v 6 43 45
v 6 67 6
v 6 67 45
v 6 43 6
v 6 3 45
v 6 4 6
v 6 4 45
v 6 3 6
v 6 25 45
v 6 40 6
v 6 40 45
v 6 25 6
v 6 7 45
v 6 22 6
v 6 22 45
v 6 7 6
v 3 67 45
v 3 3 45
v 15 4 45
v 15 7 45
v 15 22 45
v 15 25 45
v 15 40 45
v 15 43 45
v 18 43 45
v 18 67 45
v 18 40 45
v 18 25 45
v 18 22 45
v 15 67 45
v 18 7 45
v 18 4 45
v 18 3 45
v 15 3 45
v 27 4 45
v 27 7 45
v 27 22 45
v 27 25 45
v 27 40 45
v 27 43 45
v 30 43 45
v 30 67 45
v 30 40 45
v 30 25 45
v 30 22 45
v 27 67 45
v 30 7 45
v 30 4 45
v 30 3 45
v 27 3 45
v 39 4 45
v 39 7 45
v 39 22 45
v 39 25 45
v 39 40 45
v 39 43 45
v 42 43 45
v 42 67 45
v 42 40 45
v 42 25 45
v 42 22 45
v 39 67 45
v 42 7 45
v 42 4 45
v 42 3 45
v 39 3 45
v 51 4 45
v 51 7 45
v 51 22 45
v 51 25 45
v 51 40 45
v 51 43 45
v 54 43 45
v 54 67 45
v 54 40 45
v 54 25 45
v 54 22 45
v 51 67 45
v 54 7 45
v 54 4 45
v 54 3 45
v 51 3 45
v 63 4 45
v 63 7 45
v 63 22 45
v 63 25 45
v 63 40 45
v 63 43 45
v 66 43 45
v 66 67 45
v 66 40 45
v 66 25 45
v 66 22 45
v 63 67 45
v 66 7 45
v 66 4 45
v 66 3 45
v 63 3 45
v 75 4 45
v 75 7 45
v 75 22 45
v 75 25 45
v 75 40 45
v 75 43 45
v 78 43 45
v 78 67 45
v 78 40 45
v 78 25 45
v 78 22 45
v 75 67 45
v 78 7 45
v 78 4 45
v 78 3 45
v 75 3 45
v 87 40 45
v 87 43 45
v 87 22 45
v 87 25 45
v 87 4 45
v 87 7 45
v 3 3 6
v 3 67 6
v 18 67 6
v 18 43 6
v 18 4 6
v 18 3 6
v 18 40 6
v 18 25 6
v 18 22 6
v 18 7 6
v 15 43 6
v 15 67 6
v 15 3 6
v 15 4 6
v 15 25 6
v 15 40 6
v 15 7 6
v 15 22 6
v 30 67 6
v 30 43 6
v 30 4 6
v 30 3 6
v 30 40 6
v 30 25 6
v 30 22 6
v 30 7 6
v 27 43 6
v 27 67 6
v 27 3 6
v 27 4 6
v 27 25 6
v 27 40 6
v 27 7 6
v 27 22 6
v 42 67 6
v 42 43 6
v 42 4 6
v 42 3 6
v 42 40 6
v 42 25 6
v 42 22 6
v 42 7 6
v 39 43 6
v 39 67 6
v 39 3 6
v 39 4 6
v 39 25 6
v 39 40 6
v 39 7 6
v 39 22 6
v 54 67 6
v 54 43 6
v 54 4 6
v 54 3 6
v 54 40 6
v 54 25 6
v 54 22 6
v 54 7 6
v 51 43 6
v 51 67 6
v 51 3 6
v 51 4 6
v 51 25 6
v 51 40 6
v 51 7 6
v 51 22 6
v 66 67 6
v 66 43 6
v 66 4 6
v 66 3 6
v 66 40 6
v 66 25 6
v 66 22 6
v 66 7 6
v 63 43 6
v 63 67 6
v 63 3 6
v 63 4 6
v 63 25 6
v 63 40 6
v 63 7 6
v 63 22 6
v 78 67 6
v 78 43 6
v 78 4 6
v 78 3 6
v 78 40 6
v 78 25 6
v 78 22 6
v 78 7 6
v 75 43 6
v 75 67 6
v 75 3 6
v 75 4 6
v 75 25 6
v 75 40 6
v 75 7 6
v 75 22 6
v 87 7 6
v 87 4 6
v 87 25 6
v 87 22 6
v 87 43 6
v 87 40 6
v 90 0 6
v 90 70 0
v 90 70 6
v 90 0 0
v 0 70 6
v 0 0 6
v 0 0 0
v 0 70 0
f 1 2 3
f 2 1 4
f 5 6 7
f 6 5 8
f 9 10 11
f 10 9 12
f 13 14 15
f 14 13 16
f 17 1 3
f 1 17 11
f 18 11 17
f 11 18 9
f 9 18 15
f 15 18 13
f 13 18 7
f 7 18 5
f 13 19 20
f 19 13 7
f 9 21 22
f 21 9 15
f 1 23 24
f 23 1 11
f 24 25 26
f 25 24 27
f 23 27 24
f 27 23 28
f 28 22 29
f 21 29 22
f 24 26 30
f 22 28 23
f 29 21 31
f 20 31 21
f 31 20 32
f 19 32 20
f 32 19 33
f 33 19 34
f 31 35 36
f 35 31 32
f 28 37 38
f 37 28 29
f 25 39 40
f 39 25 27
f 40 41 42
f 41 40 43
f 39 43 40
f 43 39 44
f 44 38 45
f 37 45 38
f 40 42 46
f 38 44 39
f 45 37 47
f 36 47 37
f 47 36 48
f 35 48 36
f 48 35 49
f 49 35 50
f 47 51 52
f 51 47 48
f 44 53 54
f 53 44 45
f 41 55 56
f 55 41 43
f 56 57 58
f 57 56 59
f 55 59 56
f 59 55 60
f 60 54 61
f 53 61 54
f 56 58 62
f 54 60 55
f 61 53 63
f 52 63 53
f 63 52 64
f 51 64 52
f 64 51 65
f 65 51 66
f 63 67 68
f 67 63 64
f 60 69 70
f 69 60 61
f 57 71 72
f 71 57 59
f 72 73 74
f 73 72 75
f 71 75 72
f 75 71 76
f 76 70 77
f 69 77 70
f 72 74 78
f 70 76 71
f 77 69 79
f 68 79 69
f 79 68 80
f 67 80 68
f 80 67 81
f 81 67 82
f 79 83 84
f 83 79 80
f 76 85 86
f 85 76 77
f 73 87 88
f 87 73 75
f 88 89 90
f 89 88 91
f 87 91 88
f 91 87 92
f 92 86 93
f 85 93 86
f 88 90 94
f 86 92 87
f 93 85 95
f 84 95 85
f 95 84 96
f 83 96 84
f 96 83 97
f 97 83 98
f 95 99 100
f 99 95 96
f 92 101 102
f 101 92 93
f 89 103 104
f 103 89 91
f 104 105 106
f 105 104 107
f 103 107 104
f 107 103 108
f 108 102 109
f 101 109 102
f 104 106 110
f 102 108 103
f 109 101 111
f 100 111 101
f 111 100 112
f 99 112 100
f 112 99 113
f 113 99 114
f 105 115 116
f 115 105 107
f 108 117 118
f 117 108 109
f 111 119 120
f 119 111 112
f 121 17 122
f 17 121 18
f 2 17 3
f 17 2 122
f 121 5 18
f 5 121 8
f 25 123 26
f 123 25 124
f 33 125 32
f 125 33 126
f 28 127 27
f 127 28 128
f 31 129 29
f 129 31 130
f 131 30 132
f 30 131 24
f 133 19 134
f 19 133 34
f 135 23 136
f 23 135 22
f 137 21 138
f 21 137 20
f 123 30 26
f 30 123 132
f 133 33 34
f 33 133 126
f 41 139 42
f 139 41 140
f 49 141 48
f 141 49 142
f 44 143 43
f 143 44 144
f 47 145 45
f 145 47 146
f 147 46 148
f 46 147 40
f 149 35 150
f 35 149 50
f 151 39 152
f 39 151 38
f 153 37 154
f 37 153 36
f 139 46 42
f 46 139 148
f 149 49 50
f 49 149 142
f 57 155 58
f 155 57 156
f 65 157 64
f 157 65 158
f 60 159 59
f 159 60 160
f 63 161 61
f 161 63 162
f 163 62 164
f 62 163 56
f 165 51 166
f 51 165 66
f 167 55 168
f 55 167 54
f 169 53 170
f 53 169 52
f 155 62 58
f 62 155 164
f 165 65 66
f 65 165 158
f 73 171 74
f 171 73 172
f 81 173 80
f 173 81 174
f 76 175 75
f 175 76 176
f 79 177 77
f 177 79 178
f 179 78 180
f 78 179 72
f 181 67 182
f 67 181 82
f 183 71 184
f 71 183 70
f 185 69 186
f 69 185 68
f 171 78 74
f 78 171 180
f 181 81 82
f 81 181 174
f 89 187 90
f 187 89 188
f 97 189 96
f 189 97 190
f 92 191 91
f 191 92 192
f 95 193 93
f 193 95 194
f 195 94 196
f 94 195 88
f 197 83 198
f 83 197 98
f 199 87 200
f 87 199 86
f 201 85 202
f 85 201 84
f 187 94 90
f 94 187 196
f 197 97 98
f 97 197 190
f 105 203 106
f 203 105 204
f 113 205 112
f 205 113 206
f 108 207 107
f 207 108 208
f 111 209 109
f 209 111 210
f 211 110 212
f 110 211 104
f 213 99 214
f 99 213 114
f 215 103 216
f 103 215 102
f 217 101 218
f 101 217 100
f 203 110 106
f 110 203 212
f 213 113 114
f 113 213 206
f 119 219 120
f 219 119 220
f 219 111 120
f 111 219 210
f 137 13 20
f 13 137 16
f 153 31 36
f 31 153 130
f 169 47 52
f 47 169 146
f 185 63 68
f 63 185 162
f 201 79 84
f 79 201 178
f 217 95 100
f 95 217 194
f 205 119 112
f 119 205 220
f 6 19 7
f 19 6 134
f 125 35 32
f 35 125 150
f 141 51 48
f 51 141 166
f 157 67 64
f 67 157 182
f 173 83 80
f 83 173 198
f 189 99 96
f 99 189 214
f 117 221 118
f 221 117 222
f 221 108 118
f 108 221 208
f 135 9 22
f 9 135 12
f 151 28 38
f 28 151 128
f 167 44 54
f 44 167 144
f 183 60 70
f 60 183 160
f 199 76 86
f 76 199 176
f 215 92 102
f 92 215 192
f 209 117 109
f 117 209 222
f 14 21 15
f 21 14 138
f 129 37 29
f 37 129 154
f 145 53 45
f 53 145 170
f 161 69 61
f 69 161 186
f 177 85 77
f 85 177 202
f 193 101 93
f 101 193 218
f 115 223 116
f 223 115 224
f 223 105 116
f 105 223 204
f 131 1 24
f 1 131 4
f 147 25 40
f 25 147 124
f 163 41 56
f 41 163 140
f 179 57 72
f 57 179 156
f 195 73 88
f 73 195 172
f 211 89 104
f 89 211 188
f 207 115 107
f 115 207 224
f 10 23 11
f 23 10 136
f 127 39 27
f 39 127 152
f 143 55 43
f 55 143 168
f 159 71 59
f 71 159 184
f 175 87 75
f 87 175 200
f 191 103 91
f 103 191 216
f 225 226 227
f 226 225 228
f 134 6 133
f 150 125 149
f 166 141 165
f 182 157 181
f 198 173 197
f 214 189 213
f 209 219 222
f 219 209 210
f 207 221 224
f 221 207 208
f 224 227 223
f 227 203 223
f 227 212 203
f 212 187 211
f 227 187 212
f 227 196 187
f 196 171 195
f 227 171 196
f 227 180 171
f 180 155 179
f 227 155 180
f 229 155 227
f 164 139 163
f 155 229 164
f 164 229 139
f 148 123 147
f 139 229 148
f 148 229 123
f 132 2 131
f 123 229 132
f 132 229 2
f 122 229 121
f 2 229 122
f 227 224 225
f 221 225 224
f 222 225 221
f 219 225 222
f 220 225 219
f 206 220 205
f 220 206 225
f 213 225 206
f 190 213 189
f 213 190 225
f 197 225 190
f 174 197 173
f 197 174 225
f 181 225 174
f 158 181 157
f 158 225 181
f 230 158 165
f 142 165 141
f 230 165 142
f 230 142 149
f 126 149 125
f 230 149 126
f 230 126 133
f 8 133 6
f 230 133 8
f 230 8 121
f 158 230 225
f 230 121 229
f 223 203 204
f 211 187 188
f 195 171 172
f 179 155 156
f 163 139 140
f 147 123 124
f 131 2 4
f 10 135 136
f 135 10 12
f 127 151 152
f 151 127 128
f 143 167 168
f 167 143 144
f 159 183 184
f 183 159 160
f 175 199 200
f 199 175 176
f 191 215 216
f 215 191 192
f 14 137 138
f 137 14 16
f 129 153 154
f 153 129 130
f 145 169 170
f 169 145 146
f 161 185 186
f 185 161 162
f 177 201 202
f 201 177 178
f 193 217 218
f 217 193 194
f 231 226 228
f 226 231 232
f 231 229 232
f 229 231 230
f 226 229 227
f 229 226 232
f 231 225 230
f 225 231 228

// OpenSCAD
$fn = 32;

// ----------------------------------------------------------------------
// Heatsink: cross fin block
// ----------------------------------------------------------------------

// --- parameters (mm) ---
base_l = 90;              // base length, X
base_w = 70;              // base width, Y
base_t = 6;               // base plate thickness
fin_h = 40;               // fin height above the base
fin_t = 3;                // fin thickness
edge = 3;                 // margin from the base ends
pitch = 12;               // fin pitch
rib_pitch = 18;           // cross rib pitch
fit_tol = 0.05;           // tolerance for press fits, mm
free_tol = 0.3;           // tolerance for clearance fits, mm

n_fins = floor((base_l - 2 * edge - fin_t) / pitch) + 1;  // fin count
total_h = base_t + fin_h - 1;  // overall height
n_ribs = floor((base_w - 2 * edge) / rib_pitch);  // rib count

union() {
  cube([base_l, base_w, base_t]);
  for (i = [0 : n_fins - 1])
    translate([edge + i * pitch, edge, base_t - 1])
      cube([fin_t, base_w - 2 * edge, fin_h]);
  for (i = [0 : n_ribs - 1])
    translate([edge, edge + 1 + i * rib_pitch, base_t - 1])
      cube([base_l - 2 * edge, fin_t, fin_h]);
}
